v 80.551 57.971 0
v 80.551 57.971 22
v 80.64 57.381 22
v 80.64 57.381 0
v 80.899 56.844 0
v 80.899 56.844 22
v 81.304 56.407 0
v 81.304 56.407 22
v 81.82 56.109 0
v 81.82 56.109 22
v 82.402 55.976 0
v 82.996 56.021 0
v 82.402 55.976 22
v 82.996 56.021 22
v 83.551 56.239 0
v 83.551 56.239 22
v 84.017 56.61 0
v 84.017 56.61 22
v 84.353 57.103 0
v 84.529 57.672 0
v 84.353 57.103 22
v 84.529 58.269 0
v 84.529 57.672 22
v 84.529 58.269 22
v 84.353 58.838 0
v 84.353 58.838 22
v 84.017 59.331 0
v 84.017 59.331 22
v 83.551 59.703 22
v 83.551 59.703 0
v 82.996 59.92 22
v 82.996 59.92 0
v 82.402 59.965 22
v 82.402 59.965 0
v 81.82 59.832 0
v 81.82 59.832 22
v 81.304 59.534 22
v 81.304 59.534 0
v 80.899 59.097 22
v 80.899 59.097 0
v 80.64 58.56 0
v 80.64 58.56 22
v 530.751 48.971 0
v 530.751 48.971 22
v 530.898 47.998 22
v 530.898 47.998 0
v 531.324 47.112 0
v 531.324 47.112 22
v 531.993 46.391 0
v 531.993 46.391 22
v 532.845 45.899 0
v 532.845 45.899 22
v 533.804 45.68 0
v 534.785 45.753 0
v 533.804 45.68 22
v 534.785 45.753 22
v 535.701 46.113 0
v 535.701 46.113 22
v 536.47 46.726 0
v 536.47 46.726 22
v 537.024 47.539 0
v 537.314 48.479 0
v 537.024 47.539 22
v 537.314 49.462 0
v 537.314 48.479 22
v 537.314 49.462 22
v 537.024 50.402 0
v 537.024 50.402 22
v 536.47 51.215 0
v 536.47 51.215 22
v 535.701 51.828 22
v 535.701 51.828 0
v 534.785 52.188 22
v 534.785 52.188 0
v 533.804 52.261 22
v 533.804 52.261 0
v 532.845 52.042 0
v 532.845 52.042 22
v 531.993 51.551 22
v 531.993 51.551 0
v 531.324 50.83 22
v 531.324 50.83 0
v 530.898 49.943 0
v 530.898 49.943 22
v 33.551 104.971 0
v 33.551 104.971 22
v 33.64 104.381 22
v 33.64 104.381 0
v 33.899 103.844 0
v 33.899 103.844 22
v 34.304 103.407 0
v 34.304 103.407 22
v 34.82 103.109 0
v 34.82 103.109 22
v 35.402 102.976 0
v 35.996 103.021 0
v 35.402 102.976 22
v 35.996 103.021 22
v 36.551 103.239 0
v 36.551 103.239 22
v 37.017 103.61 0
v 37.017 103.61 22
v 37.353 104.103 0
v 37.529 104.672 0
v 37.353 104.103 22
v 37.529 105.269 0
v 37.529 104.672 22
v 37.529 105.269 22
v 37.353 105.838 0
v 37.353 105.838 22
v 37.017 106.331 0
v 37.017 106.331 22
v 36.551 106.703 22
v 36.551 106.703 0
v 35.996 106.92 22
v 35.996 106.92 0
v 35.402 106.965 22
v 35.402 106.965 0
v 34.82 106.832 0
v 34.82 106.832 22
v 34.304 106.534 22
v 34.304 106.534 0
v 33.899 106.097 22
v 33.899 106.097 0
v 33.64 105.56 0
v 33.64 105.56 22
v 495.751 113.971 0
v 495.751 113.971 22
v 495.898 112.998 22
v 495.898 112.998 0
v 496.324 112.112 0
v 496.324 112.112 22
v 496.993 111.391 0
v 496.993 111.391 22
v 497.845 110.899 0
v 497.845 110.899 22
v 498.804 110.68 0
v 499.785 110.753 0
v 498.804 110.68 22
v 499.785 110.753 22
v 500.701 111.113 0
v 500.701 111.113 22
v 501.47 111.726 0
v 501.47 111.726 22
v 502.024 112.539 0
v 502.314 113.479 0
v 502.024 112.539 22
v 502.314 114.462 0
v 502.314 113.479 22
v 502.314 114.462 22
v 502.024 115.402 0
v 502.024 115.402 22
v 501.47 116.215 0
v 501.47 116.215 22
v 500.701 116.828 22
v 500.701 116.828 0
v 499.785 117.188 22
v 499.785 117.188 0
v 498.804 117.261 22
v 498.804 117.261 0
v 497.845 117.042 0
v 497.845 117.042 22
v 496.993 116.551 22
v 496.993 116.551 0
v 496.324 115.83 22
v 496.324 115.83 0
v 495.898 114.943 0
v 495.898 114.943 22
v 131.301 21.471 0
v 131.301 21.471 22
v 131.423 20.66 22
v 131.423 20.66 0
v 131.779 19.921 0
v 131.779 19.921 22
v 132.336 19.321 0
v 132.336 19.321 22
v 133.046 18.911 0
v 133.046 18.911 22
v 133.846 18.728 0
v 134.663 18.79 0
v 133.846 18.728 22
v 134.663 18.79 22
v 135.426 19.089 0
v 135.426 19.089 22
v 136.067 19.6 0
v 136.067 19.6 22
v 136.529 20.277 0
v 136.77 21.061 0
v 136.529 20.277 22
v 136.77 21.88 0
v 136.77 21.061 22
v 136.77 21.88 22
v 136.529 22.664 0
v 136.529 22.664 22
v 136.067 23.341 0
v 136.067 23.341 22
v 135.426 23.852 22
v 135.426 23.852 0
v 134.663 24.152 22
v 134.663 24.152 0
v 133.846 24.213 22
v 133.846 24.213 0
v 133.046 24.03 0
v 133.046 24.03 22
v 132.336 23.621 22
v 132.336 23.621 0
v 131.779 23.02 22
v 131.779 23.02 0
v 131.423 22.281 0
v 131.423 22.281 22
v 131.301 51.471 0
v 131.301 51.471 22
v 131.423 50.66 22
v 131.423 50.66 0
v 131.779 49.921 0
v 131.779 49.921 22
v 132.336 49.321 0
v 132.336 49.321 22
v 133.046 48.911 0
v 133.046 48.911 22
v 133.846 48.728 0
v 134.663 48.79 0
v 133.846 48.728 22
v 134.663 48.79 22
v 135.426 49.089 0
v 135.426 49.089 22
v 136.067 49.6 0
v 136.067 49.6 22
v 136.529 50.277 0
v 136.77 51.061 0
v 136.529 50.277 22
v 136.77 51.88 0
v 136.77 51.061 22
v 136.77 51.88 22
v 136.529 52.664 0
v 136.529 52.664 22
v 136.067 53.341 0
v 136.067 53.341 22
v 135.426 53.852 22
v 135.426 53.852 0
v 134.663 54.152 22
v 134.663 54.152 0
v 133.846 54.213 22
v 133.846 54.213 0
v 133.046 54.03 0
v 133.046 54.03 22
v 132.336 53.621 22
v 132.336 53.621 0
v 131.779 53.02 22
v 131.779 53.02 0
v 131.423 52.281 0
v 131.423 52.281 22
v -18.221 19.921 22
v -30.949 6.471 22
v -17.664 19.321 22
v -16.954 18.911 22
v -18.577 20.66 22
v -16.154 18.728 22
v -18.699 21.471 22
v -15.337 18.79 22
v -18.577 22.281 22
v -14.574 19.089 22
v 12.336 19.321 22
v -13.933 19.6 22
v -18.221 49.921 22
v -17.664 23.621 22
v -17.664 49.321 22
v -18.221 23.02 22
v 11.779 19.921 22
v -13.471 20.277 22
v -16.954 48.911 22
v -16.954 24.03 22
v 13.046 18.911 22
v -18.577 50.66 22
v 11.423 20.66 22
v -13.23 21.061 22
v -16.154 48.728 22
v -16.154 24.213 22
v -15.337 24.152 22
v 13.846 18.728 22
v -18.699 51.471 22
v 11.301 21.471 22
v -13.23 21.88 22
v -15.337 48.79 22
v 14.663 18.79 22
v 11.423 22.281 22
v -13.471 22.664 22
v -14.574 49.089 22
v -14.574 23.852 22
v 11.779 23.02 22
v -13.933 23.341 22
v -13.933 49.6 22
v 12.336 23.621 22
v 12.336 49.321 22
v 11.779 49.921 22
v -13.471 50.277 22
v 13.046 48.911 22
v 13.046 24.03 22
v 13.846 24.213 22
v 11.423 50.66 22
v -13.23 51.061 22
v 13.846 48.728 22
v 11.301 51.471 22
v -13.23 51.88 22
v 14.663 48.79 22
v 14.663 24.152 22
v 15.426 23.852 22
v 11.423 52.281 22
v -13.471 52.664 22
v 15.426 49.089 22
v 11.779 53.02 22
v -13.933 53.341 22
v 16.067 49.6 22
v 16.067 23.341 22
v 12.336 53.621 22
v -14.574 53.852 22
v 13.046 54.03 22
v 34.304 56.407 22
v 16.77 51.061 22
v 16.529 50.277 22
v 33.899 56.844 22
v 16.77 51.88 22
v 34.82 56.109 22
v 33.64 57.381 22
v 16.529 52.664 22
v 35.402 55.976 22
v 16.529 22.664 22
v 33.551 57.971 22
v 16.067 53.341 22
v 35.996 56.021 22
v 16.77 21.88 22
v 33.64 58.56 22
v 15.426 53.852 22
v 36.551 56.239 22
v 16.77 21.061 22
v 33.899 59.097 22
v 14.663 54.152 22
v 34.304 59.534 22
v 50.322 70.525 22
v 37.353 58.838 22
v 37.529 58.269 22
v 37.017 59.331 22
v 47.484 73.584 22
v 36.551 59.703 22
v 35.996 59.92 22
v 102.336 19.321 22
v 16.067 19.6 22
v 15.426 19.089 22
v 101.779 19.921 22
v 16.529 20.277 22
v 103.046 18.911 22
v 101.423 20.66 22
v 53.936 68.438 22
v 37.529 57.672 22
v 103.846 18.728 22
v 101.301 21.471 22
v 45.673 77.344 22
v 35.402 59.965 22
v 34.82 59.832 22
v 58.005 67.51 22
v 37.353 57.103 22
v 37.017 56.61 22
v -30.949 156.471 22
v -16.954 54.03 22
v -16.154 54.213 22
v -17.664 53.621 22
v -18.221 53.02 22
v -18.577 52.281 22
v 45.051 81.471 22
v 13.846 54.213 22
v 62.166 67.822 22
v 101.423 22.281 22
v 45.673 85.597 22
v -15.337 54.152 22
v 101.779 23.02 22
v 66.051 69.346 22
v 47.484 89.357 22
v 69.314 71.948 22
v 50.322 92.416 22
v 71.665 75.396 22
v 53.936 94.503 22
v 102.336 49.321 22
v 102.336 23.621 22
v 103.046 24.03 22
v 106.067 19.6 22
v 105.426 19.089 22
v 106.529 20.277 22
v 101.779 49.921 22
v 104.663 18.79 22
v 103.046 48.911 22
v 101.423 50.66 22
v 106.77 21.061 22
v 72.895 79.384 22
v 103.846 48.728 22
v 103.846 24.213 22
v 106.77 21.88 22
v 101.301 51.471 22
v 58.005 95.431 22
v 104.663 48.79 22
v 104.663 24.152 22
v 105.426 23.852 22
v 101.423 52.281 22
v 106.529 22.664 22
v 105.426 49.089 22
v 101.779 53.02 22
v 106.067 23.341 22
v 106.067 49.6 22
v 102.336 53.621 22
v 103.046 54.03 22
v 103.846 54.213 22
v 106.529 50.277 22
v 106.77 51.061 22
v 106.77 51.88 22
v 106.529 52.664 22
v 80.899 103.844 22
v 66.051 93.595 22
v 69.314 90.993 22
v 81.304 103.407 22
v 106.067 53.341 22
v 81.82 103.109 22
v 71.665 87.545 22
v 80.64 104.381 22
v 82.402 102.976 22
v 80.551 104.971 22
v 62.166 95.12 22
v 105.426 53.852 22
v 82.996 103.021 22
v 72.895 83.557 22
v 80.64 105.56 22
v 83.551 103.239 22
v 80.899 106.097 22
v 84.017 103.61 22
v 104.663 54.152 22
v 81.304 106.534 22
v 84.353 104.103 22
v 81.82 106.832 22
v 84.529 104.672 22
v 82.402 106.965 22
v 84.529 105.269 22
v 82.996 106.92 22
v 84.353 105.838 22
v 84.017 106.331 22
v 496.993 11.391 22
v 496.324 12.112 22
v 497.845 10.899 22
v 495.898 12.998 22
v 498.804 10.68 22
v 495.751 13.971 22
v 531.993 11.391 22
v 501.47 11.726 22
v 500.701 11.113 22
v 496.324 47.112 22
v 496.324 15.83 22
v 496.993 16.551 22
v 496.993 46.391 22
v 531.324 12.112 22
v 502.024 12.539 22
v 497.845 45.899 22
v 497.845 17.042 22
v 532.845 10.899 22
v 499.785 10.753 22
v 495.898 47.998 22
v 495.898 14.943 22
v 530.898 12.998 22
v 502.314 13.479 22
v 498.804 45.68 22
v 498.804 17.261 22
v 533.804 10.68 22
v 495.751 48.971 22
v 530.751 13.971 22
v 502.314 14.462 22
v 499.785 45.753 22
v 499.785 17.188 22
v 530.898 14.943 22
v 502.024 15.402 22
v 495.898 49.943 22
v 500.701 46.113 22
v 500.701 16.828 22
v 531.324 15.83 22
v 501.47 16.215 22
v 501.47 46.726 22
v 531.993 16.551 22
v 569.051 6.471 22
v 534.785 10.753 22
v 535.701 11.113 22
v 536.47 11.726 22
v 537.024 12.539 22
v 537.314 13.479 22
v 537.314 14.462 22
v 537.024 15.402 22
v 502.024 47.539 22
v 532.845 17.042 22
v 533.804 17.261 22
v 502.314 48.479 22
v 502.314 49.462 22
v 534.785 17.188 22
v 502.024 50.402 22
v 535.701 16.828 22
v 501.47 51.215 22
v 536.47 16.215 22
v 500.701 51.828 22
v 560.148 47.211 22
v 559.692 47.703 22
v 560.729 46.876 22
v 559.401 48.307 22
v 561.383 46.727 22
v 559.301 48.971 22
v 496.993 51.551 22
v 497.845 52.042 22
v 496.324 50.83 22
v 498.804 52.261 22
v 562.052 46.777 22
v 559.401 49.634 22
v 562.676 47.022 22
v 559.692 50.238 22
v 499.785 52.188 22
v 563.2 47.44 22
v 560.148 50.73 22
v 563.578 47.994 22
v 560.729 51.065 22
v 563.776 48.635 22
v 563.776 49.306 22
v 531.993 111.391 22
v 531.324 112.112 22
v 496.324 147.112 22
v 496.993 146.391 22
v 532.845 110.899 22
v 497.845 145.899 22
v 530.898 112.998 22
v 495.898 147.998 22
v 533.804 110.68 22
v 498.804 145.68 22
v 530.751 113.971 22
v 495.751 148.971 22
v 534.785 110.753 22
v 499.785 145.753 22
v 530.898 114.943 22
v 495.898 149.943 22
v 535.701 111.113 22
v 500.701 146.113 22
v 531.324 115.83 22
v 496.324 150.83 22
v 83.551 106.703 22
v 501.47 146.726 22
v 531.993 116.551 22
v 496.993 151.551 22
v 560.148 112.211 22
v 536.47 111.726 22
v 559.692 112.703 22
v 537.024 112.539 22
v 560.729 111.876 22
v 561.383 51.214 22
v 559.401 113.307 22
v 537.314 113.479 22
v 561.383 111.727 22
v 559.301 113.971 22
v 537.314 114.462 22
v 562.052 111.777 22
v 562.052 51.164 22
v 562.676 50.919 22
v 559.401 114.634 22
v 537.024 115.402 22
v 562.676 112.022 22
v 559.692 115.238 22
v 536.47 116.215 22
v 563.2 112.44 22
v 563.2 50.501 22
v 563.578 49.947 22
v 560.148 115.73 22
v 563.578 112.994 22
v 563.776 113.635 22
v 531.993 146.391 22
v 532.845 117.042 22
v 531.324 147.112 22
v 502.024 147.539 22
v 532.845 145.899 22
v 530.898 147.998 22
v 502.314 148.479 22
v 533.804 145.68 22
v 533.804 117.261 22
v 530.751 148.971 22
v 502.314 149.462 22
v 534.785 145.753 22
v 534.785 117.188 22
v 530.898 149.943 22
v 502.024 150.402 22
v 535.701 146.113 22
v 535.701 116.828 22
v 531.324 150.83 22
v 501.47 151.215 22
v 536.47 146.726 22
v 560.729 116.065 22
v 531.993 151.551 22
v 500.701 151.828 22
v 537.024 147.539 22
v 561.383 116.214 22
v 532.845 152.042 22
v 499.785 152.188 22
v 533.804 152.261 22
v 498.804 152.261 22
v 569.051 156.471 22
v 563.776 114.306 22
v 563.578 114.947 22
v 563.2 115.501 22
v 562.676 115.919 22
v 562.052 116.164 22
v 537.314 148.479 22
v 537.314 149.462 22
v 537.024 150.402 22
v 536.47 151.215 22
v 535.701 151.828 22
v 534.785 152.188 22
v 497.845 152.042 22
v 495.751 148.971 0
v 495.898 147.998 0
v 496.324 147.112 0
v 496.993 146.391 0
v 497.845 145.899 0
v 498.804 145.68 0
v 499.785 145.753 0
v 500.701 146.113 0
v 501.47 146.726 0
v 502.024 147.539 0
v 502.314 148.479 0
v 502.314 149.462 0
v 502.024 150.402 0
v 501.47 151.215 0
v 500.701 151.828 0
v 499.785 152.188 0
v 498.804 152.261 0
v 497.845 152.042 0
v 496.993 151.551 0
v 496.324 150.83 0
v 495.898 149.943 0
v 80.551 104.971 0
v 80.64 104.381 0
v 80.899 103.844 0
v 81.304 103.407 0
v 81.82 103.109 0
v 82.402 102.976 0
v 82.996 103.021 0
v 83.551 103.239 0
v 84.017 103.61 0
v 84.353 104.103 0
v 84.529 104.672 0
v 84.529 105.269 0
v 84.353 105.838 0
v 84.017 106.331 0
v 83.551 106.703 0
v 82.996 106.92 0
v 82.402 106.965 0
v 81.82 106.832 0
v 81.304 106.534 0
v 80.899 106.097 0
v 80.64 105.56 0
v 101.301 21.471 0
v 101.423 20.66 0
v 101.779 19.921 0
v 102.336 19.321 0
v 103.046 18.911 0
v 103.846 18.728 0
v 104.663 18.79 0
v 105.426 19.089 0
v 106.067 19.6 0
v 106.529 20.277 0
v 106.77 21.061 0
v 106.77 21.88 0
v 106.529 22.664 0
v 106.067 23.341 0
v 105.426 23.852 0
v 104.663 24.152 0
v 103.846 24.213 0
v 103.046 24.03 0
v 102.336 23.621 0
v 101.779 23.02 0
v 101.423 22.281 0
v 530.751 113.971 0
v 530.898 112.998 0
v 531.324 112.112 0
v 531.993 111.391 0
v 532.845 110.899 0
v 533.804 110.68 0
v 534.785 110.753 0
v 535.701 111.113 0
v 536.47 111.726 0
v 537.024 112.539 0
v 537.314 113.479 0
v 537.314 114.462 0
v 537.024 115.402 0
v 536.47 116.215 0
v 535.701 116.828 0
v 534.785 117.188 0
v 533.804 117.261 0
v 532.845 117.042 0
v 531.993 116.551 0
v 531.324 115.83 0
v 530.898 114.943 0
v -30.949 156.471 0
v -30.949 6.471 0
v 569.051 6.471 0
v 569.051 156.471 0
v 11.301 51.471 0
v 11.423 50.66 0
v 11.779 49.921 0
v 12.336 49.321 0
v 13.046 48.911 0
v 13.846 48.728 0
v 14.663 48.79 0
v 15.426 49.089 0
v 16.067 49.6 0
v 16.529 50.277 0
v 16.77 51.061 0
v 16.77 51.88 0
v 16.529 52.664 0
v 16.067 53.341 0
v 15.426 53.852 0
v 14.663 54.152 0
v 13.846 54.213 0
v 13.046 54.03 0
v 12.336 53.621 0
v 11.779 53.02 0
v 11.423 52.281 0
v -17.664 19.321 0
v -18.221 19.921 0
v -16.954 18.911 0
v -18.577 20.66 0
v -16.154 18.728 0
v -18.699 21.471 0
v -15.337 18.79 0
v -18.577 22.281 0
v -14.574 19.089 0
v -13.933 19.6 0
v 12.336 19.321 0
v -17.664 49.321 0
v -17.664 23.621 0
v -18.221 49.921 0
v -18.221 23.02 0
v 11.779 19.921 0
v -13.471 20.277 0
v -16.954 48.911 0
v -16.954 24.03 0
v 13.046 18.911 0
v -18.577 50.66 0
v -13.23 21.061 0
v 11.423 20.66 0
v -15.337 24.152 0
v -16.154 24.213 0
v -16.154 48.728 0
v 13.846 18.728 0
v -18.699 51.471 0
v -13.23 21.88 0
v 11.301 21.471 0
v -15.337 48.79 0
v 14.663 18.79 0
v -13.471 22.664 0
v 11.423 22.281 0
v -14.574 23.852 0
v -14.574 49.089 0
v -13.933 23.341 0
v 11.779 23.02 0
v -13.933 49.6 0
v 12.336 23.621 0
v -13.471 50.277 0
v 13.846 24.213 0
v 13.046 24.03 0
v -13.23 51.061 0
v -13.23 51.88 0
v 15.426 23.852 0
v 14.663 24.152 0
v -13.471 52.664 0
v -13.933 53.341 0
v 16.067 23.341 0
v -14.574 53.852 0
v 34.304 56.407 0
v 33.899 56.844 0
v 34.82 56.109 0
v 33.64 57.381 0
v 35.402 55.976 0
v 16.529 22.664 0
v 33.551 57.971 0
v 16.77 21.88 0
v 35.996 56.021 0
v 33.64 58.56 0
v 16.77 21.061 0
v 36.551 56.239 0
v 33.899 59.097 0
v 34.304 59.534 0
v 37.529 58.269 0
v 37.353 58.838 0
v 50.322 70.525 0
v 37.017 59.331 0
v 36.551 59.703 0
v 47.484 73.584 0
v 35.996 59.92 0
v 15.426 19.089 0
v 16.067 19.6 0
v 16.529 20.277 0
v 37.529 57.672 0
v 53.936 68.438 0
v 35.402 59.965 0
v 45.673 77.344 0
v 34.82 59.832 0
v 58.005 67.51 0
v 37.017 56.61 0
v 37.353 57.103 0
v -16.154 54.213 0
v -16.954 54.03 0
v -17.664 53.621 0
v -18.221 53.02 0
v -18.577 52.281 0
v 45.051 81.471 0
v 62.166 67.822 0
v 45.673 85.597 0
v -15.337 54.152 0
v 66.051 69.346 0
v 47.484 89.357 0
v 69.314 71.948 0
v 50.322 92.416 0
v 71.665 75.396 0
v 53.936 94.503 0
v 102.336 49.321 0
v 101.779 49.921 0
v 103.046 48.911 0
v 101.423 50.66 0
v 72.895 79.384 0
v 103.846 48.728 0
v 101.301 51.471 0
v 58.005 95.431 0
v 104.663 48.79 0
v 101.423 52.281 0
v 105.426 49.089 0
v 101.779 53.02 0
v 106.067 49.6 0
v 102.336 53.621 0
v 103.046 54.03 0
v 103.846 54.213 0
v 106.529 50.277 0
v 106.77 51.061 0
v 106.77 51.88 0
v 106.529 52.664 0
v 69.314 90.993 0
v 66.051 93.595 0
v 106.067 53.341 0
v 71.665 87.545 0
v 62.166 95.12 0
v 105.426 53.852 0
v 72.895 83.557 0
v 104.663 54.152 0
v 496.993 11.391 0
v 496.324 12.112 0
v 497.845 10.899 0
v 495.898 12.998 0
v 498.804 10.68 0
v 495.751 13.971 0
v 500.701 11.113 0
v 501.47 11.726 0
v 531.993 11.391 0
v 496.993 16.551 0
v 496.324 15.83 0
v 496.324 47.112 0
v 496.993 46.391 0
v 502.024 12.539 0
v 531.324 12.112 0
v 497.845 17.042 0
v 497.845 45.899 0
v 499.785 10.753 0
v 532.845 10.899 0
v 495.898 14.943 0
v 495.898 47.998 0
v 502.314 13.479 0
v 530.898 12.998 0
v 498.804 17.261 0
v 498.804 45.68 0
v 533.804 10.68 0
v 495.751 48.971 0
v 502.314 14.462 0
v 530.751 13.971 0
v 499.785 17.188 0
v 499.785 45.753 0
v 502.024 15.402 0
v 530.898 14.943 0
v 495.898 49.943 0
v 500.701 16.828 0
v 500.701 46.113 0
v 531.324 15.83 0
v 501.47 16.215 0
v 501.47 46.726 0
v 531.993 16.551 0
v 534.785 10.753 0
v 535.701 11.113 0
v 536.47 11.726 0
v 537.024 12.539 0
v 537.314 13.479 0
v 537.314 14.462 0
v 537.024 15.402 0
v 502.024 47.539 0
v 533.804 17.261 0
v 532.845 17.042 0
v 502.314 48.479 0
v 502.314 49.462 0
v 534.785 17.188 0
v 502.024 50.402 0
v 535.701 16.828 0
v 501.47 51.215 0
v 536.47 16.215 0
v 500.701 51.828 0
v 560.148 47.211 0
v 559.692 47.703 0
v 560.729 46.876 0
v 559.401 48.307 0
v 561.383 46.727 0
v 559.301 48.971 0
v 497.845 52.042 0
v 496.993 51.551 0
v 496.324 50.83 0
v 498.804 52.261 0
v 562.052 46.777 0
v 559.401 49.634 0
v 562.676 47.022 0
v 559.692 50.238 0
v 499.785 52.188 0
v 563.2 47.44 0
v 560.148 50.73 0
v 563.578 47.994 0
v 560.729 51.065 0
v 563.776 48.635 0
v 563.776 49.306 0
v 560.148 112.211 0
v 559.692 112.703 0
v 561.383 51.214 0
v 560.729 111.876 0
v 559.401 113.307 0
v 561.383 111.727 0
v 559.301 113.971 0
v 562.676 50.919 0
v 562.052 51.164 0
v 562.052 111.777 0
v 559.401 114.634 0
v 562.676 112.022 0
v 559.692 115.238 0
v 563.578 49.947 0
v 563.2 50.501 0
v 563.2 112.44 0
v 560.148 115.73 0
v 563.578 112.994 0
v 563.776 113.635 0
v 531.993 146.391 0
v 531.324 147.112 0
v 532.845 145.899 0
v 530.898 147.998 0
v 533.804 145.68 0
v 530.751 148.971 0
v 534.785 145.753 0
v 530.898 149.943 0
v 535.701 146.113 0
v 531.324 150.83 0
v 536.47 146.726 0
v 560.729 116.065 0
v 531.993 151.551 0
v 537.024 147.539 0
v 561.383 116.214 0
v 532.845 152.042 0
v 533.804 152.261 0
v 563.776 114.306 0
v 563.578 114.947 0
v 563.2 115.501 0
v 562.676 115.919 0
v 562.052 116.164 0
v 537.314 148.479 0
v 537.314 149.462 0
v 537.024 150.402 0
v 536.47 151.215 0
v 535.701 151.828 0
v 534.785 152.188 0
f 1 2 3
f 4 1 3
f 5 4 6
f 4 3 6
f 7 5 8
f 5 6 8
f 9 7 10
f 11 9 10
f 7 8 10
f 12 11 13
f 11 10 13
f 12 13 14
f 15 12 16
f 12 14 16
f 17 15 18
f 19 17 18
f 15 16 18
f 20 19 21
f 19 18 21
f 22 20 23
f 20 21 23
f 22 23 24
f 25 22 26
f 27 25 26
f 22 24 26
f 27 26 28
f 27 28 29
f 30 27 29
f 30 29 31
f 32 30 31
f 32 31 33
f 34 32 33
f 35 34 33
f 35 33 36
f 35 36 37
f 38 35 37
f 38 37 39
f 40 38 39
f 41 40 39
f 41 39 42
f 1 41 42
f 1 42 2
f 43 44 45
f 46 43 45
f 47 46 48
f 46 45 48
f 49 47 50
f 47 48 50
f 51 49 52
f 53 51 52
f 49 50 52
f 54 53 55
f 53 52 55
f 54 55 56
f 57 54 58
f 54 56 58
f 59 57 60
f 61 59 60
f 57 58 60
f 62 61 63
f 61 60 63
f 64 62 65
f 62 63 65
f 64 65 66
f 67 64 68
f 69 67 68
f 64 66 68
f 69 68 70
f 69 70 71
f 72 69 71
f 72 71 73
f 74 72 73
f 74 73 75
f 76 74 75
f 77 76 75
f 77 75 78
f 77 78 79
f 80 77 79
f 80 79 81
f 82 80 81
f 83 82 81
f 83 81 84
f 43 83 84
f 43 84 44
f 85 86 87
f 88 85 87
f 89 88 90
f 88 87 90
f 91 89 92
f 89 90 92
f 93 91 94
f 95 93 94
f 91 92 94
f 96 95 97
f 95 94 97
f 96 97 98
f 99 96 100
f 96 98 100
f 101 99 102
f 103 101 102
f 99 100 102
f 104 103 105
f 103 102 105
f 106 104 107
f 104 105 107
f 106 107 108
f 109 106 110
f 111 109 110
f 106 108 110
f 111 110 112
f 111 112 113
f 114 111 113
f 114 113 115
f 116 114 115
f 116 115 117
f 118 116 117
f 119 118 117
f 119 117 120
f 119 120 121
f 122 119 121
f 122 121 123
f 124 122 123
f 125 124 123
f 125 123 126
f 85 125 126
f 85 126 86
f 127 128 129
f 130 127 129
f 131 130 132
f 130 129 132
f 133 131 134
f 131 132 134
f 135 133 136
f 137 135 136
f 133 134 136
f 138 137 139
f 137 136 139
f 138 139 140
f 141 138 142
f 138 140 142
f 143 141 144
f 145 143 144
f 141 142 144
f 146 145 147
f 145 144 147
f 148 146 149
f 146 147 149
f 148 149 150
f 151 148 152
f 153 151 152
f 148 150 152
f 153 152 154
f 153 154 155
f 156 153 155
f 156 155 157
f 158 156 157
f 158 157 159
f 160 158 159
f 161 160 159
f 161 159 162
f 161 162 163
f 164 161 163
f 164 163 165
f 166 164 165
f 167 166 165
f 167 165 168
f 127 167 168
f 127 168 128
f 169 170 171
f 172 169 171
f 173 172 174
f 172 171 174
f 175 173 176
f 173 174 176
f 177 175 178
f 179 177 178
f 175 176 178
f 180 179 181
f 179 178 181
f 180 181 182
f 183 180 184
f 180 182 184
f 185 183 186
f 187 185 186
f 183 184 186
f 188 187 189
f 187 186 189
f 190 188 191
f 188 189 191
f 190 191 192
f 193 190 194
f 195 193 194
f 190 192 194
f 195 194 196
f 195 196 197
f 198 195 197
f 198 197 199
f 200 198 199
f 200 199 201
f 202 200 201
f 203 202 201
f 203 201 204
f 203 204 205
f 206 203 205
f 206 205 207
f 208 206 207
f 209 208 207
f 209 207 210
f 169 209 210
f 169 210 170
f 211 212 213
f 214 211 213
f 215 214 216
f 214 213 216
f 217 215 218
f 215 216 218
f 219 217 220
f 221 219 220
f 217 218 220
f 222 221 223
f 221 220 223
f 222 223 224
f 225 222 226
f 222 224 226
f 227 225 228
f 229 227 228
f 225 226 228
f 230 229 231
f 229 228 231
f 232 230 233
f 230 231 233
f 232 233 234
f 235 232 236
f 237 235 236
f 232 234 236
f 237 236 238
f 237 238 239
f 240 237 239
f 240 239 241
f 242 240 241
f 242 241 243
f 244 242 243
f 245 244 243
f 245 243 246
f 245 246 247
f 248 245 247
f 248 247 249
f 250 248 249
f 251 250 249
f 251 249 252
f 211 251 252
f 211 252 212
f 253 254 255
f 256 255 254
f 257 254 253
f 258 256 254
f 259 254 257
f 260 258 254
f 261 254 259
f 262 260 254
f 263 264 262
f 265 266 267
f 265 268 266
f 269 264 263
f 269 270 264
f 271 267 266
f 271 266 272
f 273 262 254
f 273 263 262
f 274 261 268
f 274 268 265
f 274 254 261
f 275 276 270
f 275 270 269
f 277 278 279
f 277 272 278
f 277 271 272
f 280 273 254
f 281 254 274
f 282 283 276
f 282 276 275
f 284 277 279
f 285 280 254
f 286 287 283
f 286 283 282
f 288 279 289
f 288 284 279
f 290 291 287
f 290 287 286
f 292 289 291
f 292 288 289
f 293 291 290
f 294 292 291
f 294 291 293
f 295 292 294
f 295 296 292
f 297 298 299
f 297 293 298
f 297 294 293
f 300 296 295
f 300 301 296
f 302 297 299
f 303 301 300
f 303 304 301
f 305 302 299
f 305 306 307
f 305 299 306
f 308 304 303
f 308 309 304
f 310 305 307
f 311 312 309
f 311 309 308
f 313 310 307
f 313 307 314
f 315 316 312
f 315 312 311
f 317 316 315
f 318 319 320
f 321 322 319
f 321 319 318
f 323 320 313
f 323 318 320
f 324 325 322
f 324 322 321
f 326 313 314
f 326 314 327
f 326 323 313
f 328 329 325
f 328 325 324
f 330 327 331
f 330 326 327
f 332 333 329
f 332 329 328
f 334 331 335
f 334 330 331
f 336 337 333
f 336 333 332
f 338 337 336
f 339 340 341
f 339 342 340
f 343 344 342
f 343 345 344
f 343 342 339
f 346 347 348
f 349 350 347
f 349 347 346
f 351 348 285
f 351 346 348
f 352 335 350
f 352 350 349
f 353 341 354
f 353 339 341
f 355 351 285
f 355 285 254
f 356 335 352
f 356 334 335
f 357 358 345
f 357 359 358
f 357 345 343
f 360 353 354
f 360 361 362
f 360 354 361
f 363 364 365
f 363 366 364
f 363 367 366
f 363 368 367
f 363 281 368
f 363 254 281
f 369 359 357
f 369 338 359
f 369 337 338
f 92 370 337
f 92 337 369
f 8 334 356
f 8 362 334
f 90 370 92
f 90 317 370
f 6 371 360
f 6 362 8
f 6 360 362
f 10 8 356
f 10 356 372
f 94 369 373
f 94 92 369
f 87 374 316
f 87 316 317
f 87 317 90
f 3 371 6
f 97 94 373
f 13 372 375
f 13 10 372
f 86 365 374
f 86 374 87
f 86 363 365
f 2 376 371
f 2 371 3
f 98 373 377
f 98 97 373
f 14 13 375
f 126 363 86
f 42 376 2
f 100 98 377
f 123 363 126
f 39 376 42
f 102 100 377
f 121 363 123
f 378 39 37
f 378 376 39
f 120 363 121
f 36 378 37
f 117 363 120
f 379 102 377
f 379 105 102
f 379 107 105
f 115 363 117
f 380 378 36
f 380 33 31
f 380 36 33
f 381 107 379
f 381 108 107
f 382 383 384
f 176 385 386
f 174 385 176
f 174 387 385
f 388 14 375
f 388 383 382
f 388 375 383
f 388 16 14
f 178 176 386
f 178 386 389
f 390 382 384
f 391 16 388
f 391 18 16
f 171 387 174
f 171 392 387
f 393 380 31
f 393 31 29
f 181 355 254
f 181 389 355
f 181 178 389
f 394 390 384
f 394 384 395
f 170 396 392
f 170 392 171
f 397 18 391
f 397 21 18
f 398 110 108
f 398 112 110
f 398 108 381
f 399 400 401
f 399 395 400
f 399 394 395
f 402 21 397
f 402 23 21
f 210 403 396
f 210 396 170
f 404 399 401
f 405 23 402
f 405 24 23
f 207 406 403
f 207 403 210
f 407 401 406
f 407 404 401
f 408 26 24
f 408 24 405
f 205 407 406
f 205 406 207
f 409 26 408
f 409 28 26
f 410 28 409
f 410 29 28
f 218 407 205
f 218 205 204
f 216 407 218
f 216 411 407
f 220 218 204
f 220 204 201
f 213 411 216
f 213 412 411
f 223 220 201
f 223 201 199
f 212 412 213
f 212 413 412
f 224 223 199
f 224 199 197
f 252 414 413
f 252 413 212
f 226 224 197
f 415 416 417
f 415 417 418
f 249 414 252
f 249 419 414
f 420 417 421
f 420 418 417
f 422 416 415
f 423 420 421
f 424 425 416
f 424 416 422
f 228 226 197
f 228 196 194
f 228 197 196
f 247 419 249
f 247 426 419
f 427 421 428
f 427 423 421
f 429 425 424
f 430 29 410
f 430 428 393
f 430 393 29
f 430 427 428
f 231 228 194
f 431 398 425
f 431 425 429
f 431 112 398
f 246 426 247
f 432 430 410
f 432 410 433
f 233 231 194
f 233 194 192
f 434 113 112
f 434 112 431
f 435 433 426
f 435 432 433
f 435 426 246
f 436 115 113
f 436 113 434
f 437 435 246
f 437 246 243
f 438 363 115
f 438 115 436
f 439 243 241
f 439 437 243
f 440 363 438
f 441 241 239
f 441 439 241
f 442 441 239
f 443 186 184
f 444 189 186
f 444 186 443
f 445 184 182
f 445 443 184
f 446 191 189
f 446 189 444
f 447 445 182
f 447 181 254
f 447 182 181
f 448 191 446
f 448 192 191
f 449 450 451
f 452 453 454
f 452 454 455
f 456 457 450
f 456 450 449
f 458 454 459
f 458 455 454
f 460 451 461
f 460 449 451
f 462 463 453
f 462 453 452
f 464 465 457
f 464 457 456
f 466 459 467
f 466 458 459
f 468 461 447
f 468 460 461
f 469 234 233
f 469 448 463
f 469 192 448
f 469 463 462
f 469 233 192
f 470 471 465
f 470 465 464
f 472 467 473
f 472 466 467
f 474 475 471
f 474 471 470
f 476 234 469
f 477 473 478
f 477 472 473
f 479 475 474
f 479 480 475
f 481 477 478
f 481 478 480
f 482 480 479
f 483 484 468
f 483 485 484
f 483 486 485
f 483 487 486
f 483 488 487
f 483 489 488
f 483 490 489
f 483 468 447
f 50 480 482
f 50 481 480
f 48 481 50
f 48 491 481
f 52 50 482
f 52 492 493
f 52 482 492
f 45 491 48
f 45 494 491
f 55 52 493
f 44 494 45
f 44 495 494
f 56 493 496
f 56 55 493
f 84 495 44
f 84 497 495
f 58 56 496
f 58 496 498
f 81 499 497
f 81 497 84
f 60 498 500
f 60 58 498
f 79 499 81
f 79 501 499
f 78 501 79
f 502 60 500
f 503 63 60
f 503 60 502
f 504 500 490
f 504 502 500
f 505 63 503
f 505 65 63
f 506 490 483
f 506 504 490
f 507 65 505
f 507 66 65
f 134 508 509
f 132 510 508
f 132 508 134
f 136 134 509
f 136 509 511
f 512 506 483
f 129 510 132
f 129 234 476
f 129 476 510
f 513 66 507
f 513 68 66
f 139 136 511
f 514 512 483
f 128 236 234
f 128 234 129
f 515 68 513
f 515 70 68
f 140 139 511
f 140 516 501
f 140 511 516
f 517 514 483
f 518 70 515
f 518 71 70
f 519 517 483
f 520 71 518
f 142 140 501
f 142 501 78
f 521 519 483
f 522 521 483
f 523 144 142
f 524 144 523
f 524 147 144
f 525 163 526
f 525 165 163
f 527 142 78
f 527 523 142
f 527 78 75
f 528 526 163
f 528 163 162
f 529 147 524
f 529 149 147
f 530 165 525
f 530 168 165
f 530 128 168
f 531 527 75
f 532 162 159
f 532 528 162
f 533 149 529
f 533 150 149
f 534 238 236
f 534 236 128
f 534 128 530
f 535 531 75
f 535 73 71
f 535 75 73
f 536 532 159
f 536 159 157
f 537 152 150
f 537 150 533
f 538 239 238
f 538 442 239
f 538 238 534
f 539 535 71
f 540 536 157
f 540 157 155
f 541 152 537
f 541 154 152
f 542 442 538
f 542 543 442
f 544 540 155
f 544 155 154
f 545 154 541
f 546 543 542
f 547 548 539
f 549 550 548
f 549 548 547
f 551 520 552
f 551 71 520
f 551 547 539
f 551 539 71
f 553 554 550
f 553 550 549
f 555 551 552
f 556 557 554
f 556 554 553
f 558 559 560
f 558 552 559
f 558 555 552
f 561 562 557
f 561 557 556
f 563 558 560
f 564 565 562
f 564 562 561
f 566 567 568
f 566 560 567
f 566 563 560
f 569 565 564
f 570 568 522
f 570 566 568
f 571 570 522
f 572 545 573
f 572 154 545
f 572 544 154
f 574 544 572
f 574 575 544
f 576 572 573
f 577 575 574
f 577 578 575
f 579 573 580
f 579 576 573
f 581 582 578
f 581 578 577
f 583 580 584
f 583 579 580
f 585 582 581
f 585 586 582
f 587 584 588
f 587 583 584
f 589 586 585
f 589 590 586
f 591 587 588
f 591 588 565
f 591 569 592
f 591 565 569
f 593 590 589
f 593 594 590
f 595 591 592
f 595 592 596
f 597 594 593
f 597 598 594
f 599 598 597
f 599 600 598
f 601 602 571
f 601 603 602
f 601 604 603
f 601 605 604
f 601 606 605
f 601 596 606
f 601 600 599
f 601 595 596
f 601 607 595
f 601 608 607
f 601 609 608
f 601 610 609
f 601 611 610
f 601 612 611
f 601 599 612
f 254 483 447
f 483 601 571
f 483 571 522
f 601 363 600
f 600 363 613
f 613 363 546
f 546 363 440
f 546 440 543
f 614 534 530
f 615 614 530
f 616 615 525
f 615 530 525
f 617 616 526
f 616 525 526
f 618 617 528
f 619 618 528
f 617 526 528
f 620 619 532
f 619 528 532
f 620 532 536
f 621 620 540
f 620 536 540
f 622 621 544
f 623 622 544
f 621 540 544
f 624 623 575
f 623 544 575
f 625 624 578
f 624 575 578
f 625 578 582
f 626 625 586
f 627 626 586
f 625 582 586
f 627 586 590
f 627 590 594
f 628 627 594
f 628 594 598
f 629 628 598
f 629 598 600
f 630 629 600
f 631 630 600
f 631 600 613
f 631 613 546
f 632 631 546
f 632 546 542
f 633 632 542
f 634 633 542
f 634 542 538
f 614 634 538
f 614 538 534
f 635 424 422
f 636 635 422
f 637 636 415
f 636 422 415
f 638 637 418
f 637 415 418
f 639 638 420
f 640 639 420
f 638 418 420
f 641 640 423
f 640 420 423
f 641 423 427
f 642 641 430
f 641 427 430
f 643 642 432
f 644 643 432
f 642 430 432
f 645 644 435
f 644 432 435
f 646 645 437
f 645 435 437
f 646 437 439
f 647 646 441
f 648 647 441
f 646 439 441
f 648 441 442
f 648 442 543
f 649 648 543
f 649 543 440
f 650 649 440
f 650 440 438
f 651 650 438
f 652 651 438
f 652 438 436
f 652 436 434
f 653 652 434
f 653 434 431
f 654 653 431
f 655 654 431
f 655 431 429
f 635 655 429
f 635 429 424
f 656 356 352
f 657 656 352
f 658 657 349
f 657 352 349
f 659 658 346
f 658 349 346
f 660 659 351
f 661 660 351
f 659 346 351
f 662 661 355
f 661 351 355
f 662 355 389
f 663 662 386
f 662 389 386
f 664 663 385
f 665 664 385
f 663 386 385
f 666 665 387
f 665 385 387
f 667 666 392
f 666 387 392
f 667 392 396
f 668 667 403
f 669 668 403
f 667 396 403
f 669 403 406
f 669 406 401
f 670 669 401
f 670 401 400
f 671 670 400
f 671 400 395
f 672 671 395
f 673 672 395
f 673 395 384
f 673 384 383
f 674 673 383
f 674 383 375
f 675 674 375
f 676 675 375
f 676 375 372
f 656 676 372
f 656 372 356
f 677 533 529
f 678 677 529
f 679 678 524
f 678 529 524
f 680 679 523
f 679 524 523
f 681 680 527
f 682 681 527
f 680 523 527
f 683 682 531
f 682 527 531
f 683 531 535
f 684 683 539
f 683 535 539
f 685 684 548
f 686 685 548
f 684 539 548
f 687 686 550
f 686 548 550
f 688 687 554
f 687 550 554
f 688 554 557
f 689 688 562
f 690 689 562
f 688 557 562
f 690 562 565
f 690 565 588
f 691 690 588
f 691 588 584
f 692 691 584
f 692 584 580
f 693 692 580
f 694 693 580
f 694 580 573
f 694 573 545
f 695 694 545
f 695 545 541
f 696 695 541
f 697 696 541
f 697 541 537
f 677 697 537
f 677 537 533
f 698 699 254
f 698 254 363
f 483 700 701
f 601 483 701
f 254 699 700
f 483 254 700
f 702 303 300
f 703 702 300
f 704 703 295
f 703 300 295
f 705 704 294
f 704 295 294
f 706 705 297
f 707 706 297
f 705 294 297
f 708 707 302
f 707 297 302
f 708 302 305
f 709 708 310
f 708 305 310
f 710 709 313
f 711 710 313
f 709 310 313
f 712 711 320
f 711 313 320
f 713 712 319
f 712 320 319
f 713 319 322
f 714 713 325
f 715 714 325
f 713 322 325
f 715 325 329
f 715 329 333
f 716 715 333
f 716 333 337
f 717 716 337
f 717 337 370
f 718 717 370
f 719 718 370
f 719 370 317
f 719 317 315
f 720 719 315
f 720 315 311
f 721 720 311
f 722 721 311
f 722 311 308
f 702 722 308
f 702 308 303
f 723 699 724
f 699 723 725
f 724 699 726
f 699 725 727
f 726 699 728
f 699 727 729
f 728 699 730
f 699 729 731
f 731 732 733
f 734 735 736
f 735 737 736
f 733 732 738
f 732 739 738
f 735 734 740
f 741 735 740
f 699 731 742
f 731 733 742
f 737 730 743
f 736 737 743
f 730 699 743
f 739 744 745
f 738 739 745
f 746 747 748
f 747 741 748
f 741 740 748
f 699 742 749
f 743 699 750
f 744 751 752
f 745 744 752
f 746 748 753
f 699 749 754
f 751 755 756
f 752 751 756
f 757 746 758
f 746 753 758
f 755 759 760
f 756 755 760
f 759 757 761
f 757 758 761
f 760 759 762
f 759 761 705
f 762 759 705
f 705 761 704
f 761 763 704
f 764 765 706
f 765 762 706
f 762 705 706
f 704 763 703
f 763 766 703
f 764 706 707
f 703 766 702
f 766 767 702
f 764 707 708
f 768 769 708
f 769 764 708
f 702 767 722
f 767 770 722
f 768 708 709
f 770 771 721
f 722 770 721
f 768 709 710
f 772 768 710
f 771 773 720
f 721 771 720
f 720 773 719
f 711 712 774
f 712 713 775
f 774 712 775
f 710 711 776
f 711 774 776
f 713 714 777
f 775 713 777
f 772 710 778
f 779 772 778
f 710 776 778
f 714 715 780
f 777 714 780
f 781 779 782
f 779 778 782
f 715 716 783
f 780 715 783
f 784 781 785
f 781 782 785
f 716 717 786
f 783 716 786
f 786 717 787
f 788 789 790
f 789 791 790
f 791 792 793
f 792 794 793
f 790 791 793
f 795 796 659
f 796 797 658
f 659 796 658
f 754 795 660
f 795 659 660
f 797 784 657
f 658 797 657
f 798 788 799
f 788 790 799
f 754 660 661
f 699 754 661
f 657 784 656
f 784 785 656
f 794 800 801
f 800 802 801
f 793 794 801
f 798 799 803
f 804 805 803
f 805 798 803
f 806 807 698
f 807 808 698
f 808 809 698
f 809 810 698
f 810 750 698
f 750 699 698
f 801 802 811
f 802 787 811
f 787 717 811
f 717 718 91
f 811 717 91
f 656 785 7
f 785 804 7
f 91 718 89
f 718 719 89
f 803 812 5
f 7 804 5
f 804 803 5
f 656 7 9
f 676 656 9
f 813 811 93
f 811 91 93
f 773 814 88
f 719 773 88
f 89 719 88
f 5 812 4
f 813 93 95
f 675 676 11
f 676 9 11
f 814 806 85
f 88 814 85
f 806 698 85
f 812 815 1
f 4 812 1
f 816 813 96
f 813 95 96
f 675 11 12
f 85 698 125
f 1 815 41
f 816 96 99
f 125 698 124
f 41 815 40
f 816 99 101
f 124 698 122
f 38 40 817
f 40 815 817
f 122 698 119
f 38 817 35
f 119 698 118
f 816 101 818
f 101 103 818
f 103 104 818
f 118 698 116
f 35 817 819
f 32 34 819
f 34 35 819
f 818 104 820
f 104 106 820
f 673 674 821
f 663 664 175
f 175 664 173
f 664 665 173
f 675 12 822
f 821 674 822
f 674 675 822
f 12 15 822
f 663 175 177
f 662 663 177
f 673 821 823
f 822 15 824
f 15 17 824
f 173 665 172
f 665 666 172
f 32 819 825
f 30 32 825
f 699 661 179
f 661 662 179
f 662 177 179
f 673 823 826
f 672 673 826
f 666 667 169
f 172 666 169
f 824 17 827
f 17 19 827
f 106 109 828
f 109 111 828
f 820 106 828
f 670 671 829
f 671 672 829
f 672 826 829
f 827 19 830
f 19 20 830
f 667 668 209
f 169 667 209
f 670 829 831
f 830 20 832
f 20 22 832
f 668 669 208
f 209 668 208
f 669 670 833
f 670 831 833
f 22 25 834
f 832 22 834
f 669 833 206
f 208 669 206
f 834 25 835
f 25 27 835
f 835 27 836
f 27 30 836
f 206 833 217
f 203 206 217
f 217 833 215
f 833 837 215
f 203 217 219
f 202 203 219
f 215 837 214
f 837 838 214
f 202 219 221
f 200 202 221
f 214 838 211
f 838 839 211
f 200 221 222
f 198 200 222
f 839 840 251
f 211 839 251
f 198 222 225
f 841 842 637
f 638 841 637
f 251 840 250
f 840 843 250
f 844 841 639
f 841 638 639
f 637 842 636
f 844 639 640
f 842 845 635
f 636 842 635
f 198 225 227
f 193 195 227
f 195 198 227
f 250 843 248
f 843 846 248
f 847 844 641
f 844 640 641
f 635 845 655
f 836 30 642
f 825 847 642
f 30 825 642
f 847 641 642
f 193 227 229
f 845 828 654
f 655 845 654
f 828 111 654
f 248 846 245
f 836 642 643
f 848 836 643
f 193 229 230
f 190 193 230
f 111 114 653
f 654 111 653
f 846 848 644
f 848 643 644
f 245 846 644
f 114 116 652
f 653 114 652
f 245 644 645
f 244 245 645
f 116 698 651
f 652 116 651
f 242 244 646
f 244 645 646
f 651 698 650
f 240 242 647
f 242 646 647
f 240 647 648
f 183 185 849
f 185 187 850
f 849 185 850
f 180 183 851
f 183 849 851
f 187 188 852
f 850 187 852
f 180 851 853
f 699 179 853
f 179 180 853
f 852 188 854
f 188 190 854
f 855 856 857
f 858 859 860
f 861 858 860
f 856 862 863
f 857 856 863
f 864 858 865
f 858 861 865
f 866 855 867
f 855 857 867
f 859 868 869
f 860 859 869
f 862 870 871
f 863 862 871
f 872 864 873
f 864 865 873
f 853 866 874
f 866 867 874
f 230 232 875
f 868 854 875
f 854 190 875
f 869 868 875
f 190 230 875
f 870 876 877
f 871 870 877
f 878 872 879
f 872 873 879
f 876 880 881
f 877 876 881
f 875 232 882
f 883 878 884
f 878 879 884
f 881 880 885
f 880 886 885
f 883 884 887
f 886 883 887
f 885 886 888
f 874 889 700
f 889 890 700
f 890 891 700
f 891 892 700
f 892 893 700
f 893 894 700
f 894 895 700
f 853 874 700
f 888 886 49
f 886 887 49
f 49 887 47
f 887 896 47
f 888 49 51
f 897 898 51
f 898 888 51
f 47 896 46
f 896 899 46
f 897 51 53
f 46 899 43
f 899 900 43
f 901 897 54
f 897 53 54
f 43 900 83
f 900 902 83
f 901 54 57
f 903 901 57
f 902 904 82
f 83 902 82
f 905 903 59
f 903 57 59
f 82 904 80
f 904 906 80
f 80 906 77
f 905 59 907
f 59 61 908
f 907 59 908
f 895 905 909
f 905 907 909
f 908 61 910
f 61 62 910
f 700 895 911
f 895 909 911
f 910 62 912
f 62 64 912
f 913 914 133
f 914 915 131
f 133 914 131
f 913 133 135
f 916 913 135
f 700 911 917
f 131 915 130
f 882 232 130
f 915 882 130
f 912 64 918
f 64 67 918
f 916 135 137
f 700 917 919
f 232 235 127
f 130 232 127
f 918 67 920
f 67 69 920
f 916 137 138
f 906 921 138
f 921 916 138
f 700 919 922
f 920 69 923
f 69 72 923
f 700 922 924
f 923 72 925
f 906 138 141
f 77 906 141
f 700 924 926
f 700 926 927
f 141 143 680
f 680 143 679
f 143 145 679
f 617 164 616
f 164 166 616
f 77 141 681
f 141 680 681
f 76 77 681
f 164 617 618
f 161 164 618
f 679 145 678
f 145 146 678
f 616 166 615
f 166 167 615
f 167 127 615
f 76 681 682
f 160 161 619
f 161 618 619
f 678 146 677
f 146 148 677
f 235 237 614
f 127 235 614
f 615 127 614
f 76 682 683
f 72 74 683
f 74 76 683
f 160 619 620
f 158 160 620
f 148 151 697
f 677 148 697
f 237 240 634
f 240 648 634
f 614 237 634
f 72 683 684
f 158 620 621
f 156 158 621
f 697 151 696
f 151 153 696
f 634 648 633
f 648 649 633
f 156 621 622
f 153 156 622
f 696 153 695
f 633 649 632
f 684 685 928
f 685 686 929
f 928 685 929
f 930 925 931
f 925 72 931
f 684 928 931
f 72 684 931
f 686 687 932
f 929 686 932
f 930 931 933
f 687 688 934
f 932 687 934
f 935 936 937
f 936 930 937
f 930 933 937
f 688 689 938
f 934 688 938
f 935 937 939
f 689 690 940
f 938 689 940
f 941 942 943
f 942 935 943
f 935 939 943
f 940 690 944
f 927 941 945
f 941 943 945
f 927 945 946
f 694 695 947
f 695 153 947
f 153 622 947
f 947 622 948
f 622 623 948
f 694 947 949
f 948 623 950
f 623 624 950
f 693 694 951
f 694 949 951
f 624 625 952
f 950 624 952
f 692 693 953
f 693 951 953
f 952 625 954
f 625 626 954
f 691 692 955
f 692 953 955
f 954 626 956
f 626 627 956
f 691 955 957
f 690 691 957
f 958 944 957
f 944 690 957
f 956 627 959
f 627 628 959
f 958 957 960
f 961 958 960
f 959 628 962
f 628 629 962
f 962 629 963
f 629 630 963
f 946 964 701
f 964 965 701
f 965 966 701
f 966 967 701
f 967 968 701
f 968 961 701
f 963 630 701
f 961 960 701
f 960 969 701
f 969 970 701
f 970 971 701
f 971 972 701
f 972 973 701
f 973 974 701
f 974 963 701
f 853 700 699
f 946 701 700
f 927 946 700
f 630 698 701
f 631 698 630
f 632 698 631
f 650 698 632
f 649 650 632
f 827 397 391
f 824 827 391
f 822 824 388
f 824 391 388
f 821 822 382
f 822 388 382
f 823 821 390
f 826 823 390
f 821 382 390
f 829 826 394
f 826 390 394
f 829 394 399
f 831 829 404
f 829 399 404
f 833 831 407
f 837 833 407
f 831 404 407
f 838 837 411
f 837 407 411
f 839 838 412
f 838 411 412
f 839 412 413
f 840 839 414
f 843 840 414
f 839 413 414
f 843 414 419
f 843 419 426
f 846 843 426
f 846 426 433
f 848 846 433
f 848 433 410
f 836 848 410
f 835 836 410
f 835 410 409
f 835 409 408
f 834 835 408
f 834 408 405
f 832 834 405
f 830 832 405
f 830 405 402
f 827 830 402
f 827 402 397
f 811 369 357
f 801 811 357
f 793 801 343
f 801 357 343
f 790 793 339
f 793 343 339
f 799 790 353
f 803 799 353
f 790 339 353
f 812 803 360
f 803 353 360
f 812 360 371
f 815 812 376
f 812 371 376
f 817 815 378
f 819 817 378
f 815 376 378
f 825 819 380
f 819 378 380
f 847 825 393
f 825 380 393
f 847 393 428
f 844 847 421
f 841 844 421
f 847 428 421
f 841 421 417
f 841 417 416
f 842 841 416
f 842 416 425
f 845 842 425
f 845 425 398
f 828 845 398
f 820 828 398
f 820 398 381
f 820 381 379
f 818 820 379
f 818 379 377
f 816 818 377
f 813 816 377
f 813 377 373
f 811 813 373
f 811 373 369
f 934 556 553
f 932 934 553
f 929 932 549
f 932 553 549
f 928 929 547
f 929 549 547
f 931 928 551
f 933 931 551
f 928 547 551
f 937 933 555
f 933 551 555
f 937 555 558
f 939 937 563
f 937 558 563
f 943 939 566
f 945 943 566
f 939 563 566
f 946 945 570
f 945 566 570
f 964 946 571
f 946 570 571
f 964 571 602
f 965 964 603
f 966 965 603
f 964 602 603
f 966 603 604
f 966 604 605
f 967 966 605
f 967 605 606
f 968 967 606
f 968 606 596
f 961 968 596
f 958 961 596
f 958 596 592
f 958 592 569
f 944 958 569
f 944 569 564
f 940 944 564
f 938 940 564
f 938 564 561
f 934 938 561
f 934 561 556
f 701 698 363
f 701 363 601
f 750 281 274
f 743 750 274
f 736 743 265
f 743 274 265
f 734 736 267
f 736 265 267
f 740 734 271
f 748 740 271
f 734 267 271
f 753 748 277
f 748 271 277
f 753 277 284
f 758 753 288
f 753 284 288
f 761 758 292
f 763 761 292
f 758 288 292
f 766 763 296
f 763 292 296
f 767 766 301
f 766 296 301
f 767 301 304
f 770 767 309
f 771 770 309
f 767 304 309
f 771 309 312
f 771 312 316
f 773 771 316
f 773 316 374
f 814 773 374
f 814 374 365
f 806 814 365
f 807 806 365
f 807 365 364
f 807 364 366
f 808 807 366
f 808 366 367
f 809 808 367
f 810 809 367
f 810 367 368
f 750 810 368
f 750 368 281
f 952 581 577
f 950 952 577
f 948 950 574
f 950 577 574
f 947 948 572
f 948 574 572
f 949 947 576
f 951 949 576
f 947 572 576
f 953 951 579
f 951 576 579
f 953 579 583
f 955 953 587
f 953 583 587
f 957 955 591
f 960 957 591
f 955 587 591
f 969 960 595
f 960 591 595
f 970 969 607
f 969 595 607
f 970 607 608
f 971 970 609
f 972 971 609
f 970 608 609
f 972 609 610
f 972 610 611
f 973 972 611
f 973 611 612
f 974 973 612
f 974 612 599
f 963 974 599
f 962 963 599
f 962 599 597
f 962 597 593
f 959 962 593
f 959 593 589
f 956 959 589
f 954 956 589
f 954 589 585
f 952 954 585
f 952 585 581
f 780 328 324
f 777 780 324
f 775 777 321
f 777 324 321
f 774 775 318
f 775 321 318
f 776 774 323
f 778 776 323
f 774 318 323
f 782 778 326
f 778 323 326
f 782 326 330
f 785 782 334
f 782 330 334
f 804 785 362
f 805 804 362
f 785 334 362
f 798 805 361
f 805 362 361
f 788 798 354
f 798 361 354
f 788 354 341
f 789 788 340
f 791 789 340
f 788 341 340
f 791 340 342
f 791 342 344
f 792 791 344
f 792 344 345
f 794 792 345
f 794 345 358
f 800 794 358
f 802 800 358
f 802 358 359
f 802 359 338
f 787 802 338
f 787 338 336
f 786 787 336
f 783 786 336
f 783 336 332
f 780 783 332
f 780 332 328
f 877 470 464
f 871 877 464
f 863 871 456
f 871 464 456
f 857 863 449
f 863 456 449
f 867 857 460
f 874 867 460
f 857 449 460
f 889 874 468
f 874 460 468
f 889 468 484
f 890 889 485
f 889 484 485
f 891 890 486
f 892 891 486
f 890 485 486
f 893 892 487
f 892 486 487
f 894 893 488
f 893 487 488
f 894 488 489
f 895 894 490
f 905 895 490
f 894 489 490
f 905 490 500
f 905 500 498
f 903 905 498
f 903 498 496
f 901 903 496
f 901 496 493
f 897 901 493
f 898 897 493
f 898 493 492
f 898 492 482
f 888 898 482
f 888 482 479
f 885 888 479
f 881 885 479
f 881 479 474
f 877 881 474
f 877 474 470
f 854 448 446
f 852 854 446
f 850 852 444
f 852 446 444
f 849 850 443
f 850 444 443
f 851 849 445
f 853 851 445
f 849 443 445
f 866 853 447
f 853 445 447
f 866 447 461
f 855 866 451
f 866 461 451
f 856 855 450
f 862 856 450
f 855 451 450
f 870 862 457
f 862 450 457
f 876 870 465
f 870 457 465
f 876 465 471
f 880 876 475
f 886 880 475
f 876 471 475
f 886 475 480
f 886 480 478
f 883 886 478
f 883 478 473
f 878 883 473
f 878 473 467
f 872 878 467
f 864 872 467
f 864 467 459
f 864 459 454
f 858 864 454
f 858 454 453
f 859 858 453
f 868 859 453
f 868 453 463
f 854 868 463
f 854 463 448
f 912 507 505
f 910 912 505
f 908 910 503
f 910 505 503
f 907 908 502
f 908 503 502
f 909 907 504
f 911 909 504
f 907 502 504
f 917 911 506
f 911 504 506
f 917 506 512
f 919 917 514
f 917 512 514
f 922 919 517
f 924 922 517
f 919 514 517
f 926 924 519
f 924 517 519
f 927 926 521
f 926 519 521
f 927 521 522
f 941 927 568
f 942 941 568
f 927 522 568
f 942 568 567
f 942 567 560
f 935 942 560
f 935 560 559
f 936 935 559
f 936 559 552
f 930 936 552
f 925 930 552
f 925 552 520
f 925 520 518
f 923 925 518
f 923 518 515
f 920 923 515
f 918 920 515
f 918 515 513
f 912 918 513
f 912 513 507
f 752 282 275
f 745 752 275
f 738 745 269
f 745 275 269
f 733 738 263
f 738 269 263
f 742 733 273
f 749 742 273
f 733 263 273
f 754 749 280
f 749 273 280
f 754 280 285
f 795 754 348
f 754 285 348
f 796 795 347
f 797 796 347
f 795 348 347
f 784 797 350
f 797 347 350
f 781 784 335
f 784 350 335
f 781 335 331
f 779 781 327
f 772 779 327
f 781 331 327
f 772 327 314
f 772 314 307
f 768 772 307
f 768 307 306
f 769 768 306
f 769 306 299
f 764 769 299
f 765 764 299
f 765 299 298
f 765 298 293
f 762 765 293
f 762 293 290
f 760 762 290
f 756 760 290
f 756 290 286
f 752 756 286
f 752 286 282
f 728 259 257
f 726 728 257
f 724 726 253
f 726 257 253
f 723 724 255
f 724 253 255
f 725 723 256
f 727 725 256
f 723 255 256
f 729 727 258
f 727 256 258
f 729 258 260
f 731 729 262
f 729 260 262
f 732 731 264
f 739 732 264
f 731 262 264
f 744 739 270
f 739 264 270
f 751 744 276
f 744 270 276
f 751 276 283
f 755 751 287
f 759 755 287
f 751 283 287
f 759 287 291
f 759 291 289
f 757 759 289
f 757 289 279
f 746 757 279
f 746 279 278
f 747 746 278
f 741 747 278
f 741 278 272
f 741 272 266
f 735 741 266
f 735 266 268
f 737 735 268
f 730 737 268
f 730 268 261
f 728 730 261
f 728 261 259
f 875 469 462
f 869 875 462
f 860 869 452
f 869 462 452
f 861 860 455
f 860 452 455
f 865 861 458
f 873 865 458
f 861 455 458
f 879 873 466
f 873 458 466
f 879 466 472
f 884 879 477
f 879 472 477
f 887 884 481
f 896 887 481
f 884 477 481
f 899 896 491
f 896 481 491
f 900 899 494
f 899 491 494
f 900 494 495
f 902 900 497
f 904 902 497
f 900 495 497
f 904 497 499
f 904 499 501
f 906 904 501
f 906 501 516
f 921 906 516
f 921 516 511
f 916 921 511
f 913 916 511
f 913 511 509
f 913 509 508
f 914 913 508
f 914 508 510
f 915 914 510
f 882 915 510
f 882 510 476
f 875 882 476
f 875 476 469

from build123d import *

# Parameters (mm, degrees)
F0_W     = 600
F0_H     = 150
F1_DEPTH = 22
F2_D     = 6.6
F3_D     = 5.5
F4_D     = 28
F5_D     = 4.5
F6_D     = 4


with BuildPart() as f1:
    # F0 (on Top) → F1 (new body)
    with BuildSketch(Plane.XY):
        with Locations((269.0510096401, 81.4705566212)):
            Rectangle(F0_W, F0_H)
    extrude(amount=F1_DEPTH)

    # F2 (through all)
    with Locations(Plane(origin=(0, 0, 0), x_dir=(1, 0, 0), z_dir=(0, 0, -1))):
        with Locations((499.0510096401, -113.9705566212), (534.0510096401, -113.9705566212), (499.0510096401, -148.9705566212), (534.0510096401, -148.9705566212), (534.0510096401, -13.9705566212), (499.0510096401, -48.9705566212), (499.0510096401, -13.9705566212), (534.0510096401, -48.9705566212)):
            Hole(F2_D / 2)

    # F3 (through all)
    with Locations(Plane(origin=(0, 0, 0), x_dir=(1, 0, 0), z_dir=(0, 0, -1))):
        with Locations((-15.9489903599, -21.4705566212), (14.0510096401, -21.4705566212), (104.0510096401, -51.4705566212), (104.0510096401, -21.4705566212), (14.0510096401, -51.4705566212), (134.0510096401, -51.4705566212), (134.0510096401, -21.4705566212), (-15.9489903599, -51.4705566212)):
            Hole(F3_D / 2)

    # F4 (through all)
    with Locations(Plane(origin=(0, 0, 0), x_dir=(1, 0, 0), z_dir=(0, 0, -1))):
        with Locations((59.0510096401, -81.4705566212)):
            Hole(F4_D / 2)

    # F5 (through all)
    with Locations(Plane(origin=(0, 0, 0), x_dir=(1, 0, 0), z_dir=(0, 0, -1))):
        with Locations((561.5510096401, -113.9705566212), (561.5510096401, -48.9705566212)):
            Hole(F5_D / 2)

    # F6 (through all)
    with Locations(Plane(origin=(0, 0, 0), x_dir=(1, 0, 0), z_dir=(0, 0, -1))):
        with Locations((82.5510096401, -104.9705566212), (35.5510096401, -104.9705566212), (35.5510096401, -57.9705566212), (82.5510096401, -57.9705566212)):
            Hole(F6_D / 2)


solid = f1.part
